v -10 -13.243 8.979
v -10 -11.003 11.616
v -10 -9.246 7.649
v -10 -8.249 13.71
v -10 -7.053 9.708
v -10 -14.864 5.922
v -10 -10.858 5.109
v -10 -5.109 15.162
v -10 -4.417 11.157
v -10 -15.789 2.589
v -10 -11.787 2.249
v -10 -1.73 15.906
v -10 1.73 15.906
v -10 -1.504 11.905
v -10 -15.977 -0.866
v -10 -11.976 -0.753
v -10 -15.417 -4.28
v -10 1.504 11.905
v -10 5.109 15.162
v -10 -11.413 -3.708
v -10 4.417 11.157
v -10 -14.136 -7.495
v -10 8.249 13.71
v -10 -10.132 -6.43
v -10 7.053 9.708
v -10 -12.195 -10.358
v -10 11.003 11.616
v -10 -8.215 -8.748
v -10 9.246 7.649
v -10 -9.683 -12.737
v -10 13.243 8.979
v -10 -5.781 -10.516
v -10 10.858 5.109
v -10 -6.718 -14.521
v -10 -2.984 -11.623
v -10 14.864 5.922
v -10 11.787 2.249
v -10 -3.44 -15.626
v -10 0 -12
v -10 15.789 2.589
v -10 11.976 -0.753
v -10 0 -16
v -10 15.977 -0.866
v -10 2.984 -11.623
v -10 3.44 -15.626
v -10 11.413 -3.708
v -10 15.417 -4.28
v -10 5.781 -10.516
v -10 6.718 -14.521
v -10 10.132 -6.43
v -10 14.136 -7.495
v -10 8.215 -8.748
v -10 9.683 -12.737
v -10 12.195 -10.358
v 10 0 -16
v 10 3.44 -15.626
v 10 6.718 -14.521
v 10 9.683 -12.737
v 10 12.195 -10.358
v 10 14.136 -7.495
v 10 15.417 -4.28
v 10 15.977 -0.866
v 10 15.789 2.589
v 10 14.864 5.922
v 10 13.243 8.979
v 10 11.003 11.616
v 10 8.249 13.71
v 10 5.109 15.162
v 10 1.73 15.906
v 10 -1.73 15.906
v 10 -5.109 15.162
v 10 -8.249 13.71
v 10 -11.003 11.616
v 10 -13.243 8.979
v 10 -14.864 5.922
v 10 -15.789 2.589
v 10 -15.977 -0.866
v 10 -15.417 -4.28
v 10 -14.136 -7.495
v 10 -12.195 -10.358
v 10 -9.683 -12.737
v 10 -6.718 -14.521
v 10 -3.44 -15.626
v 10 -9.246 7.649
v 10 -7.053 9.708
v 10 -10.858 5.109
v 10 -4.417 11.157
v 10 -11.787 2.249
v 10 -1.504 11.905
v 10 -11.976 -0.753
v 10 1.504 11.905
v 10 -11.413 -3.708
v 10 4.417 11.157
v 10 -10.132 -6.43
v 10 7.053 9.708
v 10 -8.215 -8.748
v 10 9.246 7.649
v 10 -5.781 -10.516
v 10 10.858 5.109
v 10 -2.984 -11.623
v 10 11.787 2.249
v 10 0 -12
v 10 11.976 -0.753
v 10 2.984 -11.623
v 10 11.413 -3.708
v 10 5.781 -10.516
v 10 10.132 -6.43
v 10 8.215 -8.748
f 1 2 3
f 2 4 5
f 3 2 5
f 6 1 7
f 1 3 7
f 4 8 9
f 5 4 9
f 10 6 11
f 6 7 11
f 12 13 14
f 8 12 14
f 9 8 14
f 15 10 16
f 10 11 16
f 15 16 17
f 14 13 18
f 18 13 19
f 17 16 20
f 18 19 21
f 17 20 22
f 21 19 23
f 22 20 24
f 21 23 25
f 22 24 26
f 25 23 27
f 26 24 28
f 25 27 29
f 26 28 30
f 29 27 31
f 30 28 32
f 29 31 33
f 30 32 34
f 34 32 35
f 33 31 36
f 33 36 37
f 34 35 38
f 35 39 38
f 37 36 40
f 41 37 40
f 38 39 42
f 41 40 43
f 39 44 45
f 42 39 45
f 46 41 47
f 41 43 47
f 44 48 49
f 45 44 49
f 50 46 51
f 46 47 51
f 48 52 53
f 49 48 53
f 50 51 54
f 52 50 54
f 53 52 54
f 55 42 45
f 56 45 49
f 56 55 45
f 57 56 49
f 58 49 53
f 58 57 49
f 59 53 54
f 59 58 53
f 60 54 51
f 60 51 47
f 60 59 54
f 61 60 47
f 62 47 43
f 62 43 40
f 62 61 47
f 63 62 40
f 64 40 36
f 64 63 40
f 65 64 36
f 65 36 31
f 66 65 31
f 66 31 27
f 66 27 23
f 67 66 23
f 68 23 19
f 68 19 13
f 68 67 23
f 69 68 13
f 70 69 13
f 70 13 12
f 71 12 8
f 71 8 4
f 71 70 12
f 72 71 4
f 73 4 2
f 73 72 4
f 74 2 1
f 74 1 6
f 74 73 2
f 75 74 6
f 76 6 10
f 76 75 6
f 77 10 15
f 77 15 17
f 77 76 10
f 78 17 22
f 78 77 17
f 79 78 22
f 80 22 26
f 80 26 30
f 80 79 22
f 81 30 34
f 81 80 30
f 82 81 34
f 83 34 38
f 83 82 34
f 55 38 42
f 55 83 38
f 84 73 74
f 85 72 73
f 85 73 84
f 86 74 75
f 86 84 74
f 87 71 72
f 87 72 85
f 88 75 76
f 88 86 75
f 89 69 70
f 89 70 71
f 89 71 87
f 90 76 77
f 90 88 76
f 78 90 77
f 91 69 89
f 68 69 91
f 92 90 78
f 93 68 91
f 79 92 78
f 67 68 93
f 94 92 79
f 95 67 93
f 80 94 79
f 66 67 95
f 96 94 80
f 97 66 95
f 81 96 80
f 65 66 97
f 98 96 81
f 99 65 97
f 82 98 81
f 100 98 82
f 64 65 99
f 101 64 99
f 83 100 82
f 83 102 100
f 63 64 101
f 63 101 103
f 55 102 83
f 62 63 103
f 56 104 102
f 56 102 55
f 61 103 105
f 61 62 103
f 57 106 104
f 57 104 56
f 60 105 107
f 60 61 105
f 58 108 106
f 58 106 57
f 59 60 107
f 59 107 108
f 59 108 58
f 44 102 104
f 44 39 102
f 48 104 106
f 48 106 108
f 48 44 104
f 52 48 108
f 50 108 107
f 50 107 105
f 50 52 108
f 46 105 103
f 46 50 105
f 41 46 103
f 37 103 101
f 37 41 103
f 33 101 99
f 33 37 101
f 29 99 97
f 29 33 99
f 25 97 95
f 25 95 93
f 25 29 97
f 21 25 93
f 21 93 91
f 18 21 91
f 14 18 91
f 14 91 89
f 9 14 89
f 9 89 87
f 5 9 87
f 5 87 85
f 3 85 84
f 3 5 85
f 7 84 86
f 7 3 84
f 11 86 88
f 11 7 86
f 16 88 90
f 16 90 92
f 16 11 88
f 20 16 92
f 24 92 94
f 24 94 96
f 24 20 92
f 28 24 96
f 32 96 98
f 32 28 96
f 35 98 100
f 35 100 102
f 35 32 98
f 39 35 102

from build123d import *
from build123d.topology import SkipClean

# Parameters (mm, degrees)
CAGSPISKE_W         = 16
CAGSPISKE_H         = 0.7
SKETCH1_R           = 16
SKETCH1_R_2         = 12
BOSS_EXTRUDE1_DEPTH = 10


with BuildPart() as part:
    # CagSpiSke → CageSpine (revolve)
    with BuildSketch(Plane.XY):
        with Locations((0, 14.25)):
            Rectangle(CAGSPISKE_W, CAGSPISKE_H)
    revolve(axis=Axis((-12.7, 0, 0), (1, 0, 0)))

    # RolSimSke → RollersSimplified (revolve)
    with BuildSketch(Plane.XY):
        with BuildLine():
            Line((-7.13, 16), (7.13, 16))
            ThreePointArc((7.13, 16), (7.179497475, 15.979497475), (7.2, 15.93))
            Line((7.2, 15.93), (7.2, 12.57))
            ThreePointArc((7.2, 12.57), (7.179497475, 12.520502525), (7.13, 12.5))
            Line((7.13, 12.5), (-7.13, 12.5))
            ThreePointArc((-7.13, 12.5), (-7.179497475, 12.520502525), (-7.2, 12.57))
            Line((-7.2, 12.57), (-7.2, 15.93))
            ThreePointArc((-7.2, 15.93), (-7.179497475, 15.979497475), (-7.13, 16))
        make_face()
    revolve(axis=Axis((-17.78, 0, 0), (1, 0, 0)))

    # Sketch1 → Boss-Extrude1 (add, symmetric)
    with SkipClean():  # the faces are left unmerged after this step: merging them gives an invalid solid
        with BuildSketch(Plane(origin=(0, 0, 0), x_dir=(0, 0, -1), z_dir=(1, 0, 0))):
            Circle(SKETCH1_R)
            Circle(SKETCH1_R_2, mode=Mode.SUBTRACT)
        extrude(amount=BOSS_EXTRUDE1_DEPTH, both=True)
    add(part.part.scale(1), mode=Mode.REPLACE)  # the faces are merged on a copy


solid = part.part
